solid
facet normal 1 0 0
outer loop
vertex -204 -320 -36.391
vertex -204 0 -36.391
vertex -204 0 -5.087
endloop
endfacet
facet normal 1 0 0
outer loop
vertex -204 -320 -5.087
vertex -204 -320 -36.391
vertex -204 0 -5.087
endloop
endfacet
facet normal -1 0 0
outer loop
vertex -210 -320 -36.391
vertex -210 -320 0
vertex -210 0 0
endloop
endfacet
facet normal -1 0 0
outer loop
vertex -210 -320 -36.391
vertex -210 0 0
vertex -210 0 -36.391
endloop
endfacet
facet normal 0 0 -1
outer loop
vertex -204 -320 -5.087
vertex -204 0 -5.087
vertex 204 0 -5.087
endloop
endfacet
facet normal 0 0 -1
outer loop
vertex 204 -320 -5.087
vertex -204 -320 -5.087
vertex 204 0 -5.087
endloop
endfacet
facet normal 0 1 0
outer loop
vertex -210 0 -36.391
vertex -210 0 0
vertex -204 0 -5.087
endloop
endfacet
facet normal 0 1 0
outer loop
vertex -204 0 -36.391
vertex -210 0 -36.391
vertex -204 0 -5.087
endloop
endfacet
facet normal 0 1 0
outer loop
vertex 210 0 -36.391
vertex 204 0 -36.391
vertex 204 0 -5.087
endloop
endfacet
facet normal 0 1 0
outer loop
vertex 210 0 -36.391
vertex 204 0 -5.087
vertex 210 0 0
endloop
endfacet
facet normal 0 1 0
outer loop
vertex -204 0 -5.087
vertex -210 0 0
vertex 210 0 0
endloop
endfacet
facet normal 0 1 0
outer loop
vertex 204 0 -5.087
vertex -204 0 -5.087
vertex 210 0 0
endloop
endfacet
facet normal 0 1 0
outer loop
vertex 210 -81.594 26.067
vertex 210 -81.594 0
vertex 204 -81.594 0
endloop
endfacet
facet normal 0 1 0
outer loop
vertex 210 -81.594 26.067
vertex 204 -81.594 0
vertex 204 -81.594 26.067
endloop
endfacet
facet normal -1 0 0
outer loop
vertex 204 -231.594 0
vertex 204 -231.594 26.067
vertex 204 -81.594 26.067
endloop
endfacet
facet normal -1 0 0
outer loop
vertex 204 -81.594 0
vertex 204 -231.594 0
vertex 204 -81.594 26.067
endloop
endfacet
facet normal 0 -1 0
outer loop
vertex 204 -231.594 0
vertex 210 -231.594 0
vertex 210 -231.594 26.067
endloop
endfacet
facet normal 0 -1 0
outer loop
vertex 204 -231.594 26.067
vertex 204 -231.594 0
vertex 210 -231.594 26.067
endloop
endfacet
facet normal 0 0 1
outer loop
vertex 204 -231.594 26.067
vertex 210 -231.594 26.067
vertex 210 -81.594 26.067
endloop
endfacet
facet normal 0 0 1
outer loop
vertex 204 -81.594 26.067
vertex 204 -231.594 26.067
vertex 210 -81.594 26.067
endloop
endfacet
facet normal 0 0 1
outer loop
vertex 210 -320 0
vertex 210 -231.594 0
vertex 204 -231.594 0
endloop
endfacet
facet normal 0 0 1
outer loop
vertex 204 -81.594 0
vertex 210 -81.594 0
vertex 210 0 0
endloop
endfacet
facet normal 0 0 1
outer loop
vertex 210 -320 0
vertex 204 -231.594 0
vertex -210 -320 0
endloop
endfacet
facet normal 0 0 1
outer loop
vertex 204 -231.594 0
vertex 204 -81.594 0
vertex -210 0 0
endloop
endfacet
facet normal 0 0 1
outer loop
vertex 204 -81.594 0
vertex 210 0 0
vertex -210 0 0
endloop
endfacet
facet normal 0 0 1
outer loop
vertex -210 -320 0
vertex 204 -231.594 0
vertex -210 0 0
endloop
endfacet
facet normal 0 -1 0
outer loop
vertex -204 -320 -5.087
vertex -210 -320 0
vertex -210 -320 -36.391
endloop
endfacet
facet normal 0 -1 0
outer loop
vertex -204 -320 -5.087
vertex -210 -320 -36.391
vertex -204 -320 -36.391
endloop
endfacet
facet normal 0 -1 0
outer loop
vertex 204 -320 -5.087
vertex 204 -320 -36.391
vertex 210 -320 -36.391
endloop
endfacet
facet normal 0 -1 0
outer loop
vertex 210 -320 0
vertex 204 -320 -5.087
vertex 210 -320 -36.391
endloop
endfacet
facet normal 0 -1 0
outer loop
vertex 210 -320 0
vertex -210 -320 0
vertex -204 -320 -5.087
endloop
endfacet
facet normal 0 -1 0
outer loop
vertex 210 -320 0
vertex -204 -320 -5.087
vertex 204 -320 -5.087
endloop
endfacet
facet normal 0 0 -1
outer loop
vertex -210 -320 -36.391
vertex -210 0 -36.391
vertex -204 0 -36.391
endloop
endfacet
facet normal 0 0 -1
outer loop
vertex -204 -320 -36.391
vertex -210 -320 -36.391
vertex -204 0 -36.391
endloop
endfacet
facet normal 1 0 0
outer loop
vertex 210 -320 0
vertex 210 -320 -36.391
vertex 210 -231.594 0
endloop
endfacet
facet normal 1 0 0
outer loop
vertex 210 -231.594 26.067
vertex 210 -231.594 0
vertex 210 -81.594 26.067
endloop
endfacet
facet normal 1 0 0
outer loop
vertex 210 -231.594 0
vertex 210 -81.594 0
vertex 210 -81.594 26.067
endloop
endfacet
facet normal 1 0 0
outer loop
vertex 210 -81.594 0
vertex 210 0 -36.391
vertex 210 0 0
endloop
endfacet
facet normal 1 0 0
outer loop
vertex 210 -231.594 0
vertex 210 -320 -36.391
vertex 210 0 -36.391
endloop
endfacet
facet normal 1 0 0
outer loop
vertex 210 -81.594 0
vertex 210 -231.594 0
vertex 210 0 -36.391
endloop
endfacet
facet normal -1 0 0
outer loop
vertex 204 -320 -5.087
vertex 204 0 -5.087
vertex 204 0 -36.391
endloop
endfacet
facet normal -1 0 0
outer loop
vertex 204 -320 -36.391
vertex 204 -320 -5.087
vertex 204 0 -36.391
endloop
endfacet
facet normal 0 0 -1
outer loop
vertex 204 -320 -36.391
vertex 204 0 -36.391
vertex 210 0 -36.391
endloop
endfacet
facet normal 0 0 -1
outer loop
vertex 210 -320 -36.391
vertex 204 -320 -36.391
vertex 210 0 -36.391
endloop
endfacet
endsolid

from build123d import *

# Parameters (mm, degrees)
F1_DEPTH = 320
F2_W     = 150
F2_H     = 26.066691
F3_DEPTH = 6


with BuildPart() as f1:
    # F0 (on Front) → F1 (new body)
    with BuildSketch(Plane.XZ):
        Polygon((-210, 0), (-210, -36.39128), (-204, -36.39128), (-204, -5.086953), (0, -5.086953), (204, -5.086953), (204, -36.39128), (210, -36.39128), (210, 0), (0, 0), align=None)
    extrude(amount=F1_DEPTH)

    # F2 (on face) → F3 (join)
    with BuildSketch(Plane.YZ.offset(210)):
        with Locations((-156.593922, 13.033345)):
            Rectangle(F2_W, F2_H)
    extrude(amount=-F3_DEPTH)


solid = f1.part
